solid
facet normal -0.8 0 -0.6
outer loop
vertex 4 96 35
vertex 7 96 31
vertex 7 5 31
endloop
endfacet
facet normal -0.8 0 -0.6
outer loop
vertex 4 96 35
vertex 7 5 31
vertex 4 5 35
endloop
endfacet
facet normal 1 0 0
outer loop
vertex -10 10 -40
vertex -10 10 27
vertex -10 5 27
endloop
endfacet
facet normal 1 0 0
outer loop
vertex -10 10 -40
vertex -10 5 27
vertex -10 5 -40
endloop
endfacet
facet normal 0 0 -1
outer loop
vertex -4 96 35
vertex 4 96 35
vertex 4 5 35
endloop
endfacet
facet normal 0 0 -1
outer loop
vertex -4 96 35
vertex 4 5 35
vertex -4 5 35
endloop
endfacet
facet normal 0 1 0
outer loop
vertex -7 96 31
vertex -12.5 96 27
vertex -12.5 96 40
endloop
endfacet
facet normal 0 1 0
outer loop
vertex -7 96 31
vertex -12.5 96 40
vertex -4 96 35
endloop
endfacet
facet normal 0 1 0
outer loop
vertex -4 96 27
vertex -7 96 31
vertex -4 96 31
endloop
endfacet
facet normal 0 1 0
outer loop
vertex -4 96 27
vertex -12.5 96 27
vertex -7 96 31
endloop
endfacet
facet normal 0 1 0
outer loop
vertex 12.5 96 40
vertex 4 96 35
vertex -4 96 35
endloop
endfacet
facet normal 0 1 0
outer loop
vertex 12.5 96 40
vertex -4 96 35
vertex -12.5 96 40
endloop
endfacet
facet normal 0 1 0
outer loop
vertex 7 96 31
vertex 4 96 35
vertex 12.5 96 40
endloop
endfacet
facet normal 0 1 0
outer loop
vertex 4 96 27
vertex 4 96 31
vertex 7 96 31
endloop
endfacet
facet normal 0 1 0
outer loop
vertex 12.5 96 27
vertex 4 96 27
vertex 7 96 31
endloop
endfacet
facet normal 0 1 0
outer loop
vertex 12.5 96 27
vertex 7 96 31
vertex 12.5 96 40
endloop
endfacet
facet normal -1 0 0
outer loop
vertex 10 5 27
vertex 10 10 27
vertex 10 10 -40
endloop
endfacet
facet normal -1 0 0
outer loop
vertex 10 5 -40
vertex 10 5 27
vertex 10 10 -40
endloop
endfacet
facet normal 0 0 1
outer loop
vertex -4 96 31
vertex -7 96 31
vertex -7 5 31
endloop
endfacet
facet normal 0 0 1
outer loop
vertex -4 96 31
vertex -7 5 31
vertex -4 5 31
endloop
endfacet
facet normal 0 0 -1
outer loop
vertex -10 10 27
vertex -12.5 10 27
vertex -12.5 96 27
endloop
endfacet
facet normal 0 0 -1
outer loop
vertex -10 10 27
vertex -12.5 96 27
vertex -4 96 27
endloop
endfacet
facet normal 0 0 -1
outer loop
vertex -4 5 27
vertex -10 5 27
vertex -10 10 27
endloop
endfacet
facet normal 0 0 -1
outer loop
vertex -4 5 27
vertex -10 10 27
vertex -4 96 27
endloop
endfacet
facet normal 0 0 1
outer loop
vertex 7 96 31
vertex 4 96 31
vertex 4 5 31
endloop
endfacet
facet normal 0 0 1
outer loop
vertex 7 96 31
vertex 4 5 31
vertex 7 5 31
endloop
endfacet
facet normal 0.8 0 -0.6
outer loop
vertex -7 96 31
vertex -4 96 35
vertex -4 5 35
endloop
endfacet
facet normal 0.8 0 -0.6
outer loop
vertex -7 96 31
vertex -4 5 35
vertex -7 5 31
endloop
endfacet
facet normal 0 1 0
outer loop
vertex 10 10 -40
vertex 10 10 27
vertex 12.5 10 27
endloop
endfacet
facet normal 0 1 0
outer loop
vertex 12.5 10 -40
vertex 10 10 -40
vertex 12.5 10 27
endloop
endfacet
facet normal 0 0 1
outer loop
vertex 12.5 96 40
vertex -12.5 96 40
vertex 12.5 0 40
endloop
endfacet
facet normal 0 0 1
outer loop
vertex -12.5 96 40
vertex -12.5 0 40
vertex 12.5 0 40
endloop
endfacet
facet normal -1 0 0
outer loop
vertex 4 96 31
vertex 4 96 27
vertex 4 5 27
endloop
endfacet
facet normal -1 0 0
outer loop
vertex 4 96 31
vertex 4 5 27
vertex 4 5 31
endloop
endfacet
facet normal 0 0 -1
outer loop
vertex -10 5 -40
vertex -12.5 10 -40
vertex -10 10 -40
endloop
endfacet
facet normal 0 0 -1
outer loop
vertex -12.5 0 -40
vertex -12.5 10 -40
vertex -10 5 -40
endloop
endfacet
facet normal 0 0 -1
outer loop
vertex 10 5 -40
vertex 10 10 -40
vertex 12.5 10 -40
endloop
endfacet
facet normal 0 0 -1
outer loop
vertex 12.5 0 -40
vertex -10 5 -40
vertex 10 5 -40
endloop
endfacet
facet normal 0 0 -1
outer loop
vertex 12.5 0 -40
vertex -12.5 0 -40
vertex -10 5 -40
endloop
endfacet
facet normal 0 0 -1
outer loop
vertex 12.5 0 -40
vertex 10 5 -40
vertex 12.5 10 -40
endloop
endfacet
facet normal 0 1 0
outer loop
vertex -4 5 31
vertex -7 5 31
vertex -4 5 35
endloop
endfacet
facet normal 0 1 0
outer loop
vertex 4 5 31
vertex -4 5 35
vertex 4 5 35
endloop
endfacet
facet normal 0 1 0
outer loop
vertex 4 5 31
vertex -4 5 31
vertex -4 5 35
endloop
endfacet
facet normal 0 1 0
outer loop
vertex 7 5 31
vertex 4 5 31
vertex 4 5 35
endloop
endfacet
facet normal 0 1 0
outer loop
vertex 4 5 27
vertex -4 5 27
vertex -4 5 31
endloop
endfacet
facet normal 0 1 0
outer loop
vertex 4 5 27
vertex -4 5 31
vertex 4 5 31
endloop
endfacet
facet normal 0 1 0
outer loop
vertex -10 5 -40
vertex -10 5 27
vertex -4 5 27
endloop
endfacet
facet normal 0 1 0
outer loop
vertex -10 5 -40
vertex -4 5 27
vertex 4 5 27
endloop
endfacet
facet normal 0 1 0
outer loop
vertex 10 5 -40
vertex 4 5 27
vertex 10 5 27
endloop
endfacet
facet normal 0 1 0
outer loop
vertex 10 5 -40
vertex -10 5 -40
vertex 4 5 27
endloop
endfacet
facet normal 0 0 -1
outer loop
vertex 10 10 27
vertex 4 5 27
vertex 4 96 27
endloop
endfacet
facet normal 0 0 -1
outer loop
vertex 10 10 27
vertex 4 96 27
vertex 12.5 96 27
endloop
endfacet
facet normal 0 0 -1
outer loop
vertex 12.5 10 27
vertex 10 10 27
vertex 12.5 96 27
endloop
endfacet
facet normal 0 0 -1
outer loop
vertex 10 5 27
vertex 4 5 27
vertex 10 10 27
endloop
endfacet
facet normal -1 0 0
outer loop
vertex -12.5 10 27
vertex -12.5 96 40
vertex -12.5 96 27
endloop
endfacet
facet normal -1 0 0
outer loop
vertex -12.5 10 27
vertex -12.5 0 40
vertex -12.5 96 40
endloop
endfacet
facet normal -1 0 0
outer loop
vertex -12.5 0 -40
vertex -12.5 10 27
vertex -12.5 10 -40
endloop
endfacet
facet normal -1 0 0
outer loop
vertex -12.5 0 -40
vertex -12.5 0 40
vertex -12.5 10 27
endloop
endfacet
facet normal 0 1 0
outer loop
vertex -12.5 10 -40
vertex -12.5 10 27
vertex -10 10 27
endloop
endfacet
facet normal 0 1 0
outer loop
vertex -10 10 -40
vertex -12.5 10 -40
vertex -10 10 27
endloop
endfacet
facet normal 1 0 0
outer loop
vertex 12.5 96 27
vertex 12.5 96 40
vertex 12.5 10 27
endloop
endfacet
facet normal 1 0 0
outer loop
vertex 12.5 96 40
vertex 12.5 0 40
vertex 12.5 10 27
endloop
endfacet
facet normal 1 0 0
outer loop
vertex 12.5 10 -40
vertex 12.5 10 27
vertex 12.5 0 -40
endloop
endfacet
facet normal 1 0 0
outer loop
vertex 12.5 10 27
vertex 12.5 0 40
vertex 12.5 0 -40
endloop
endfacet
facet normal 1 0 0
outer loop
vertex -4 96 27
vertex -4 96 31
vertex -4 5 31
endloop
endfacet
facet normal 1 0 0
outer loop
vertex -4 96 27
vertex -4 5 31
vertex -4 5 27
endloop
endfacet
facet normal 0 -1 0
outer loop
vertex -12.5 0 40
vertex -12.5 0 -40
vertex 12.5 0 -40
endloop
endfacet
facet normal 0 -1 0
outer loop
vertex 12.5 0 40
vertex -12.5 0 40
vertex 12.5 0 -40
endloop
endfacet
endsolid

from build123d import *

# Parameters (mm, degrees)
SKETCH1_W           = 25
SKETCH1_H           = 80
BOSS_EXTRUDE1_DEPTH = 10
SKETCH2_W           = 25
SKETCH2_H           = 13
BOSS_EXTRUDE2_DEPTH = 86
CUT_EXTRUDE1_DEPTH  = 91
SKETCH4_W           = 20
SKETCH4_H           = 67
CUT_EXTRUDE2_DEPTH  = 5


with BuildPart() as part:
    # Sketch1 → Boss-Extrude1 (new body)
    with BuildSketch(Plane(origin=(0, 0, 0), x_dir=(1, 0, 0), z_dir=(0, 1, 0))):
        Rectangle(SKETCH1_W, SKETCH1_H)
    extrude(amount=BOSS_EXTRUDE1_DEPTH)

    # Sketch2 → Boss-Extrude2 (add)
    with BuildSketch(Plane(origin=(0, 10, 0), x_dir=(1, 0, 0), z_dir=(0, 1, 0))):
        with Locations((0, -33.5)):
            Rectangle(SKETCH2_W, SKETCH2_H)
    extrude(amount=BOSS_EXTRUDE2_DEPTH)

    # Sketch3 → Cut-Extrude1 (cut)
    with BuildSketch(Plane(origin=(0, 96, 0), x_dir=(1, 0, 0), z_dir=(0, 1, 0))):
        Polygon((-4, -27), (4, -27), (4, -31), (7, -31), (4, -35), (-4, -35), (-7, -31), (-4, -31), align=None)
    extrude(amount=-CUT_EXTRUDE1_DEPTH, mode=Mode.SUBTRACT)

    # Sketch4 → Cut-Extrude2 (cut)
    with BuildSketch(Plane(origin=(0, 10, 0), x_dir=(1, 0, 0), z_dir=(0, 1, 0))):
        with Locations((0, 6.5)):
            Rectangle(SKETCH4_W, SKETCH4_H)
    extrude(amount=-CUT_EXTRUDE2_DEPTH, mode=Mode.SUBTRACT)


solid = part.part
